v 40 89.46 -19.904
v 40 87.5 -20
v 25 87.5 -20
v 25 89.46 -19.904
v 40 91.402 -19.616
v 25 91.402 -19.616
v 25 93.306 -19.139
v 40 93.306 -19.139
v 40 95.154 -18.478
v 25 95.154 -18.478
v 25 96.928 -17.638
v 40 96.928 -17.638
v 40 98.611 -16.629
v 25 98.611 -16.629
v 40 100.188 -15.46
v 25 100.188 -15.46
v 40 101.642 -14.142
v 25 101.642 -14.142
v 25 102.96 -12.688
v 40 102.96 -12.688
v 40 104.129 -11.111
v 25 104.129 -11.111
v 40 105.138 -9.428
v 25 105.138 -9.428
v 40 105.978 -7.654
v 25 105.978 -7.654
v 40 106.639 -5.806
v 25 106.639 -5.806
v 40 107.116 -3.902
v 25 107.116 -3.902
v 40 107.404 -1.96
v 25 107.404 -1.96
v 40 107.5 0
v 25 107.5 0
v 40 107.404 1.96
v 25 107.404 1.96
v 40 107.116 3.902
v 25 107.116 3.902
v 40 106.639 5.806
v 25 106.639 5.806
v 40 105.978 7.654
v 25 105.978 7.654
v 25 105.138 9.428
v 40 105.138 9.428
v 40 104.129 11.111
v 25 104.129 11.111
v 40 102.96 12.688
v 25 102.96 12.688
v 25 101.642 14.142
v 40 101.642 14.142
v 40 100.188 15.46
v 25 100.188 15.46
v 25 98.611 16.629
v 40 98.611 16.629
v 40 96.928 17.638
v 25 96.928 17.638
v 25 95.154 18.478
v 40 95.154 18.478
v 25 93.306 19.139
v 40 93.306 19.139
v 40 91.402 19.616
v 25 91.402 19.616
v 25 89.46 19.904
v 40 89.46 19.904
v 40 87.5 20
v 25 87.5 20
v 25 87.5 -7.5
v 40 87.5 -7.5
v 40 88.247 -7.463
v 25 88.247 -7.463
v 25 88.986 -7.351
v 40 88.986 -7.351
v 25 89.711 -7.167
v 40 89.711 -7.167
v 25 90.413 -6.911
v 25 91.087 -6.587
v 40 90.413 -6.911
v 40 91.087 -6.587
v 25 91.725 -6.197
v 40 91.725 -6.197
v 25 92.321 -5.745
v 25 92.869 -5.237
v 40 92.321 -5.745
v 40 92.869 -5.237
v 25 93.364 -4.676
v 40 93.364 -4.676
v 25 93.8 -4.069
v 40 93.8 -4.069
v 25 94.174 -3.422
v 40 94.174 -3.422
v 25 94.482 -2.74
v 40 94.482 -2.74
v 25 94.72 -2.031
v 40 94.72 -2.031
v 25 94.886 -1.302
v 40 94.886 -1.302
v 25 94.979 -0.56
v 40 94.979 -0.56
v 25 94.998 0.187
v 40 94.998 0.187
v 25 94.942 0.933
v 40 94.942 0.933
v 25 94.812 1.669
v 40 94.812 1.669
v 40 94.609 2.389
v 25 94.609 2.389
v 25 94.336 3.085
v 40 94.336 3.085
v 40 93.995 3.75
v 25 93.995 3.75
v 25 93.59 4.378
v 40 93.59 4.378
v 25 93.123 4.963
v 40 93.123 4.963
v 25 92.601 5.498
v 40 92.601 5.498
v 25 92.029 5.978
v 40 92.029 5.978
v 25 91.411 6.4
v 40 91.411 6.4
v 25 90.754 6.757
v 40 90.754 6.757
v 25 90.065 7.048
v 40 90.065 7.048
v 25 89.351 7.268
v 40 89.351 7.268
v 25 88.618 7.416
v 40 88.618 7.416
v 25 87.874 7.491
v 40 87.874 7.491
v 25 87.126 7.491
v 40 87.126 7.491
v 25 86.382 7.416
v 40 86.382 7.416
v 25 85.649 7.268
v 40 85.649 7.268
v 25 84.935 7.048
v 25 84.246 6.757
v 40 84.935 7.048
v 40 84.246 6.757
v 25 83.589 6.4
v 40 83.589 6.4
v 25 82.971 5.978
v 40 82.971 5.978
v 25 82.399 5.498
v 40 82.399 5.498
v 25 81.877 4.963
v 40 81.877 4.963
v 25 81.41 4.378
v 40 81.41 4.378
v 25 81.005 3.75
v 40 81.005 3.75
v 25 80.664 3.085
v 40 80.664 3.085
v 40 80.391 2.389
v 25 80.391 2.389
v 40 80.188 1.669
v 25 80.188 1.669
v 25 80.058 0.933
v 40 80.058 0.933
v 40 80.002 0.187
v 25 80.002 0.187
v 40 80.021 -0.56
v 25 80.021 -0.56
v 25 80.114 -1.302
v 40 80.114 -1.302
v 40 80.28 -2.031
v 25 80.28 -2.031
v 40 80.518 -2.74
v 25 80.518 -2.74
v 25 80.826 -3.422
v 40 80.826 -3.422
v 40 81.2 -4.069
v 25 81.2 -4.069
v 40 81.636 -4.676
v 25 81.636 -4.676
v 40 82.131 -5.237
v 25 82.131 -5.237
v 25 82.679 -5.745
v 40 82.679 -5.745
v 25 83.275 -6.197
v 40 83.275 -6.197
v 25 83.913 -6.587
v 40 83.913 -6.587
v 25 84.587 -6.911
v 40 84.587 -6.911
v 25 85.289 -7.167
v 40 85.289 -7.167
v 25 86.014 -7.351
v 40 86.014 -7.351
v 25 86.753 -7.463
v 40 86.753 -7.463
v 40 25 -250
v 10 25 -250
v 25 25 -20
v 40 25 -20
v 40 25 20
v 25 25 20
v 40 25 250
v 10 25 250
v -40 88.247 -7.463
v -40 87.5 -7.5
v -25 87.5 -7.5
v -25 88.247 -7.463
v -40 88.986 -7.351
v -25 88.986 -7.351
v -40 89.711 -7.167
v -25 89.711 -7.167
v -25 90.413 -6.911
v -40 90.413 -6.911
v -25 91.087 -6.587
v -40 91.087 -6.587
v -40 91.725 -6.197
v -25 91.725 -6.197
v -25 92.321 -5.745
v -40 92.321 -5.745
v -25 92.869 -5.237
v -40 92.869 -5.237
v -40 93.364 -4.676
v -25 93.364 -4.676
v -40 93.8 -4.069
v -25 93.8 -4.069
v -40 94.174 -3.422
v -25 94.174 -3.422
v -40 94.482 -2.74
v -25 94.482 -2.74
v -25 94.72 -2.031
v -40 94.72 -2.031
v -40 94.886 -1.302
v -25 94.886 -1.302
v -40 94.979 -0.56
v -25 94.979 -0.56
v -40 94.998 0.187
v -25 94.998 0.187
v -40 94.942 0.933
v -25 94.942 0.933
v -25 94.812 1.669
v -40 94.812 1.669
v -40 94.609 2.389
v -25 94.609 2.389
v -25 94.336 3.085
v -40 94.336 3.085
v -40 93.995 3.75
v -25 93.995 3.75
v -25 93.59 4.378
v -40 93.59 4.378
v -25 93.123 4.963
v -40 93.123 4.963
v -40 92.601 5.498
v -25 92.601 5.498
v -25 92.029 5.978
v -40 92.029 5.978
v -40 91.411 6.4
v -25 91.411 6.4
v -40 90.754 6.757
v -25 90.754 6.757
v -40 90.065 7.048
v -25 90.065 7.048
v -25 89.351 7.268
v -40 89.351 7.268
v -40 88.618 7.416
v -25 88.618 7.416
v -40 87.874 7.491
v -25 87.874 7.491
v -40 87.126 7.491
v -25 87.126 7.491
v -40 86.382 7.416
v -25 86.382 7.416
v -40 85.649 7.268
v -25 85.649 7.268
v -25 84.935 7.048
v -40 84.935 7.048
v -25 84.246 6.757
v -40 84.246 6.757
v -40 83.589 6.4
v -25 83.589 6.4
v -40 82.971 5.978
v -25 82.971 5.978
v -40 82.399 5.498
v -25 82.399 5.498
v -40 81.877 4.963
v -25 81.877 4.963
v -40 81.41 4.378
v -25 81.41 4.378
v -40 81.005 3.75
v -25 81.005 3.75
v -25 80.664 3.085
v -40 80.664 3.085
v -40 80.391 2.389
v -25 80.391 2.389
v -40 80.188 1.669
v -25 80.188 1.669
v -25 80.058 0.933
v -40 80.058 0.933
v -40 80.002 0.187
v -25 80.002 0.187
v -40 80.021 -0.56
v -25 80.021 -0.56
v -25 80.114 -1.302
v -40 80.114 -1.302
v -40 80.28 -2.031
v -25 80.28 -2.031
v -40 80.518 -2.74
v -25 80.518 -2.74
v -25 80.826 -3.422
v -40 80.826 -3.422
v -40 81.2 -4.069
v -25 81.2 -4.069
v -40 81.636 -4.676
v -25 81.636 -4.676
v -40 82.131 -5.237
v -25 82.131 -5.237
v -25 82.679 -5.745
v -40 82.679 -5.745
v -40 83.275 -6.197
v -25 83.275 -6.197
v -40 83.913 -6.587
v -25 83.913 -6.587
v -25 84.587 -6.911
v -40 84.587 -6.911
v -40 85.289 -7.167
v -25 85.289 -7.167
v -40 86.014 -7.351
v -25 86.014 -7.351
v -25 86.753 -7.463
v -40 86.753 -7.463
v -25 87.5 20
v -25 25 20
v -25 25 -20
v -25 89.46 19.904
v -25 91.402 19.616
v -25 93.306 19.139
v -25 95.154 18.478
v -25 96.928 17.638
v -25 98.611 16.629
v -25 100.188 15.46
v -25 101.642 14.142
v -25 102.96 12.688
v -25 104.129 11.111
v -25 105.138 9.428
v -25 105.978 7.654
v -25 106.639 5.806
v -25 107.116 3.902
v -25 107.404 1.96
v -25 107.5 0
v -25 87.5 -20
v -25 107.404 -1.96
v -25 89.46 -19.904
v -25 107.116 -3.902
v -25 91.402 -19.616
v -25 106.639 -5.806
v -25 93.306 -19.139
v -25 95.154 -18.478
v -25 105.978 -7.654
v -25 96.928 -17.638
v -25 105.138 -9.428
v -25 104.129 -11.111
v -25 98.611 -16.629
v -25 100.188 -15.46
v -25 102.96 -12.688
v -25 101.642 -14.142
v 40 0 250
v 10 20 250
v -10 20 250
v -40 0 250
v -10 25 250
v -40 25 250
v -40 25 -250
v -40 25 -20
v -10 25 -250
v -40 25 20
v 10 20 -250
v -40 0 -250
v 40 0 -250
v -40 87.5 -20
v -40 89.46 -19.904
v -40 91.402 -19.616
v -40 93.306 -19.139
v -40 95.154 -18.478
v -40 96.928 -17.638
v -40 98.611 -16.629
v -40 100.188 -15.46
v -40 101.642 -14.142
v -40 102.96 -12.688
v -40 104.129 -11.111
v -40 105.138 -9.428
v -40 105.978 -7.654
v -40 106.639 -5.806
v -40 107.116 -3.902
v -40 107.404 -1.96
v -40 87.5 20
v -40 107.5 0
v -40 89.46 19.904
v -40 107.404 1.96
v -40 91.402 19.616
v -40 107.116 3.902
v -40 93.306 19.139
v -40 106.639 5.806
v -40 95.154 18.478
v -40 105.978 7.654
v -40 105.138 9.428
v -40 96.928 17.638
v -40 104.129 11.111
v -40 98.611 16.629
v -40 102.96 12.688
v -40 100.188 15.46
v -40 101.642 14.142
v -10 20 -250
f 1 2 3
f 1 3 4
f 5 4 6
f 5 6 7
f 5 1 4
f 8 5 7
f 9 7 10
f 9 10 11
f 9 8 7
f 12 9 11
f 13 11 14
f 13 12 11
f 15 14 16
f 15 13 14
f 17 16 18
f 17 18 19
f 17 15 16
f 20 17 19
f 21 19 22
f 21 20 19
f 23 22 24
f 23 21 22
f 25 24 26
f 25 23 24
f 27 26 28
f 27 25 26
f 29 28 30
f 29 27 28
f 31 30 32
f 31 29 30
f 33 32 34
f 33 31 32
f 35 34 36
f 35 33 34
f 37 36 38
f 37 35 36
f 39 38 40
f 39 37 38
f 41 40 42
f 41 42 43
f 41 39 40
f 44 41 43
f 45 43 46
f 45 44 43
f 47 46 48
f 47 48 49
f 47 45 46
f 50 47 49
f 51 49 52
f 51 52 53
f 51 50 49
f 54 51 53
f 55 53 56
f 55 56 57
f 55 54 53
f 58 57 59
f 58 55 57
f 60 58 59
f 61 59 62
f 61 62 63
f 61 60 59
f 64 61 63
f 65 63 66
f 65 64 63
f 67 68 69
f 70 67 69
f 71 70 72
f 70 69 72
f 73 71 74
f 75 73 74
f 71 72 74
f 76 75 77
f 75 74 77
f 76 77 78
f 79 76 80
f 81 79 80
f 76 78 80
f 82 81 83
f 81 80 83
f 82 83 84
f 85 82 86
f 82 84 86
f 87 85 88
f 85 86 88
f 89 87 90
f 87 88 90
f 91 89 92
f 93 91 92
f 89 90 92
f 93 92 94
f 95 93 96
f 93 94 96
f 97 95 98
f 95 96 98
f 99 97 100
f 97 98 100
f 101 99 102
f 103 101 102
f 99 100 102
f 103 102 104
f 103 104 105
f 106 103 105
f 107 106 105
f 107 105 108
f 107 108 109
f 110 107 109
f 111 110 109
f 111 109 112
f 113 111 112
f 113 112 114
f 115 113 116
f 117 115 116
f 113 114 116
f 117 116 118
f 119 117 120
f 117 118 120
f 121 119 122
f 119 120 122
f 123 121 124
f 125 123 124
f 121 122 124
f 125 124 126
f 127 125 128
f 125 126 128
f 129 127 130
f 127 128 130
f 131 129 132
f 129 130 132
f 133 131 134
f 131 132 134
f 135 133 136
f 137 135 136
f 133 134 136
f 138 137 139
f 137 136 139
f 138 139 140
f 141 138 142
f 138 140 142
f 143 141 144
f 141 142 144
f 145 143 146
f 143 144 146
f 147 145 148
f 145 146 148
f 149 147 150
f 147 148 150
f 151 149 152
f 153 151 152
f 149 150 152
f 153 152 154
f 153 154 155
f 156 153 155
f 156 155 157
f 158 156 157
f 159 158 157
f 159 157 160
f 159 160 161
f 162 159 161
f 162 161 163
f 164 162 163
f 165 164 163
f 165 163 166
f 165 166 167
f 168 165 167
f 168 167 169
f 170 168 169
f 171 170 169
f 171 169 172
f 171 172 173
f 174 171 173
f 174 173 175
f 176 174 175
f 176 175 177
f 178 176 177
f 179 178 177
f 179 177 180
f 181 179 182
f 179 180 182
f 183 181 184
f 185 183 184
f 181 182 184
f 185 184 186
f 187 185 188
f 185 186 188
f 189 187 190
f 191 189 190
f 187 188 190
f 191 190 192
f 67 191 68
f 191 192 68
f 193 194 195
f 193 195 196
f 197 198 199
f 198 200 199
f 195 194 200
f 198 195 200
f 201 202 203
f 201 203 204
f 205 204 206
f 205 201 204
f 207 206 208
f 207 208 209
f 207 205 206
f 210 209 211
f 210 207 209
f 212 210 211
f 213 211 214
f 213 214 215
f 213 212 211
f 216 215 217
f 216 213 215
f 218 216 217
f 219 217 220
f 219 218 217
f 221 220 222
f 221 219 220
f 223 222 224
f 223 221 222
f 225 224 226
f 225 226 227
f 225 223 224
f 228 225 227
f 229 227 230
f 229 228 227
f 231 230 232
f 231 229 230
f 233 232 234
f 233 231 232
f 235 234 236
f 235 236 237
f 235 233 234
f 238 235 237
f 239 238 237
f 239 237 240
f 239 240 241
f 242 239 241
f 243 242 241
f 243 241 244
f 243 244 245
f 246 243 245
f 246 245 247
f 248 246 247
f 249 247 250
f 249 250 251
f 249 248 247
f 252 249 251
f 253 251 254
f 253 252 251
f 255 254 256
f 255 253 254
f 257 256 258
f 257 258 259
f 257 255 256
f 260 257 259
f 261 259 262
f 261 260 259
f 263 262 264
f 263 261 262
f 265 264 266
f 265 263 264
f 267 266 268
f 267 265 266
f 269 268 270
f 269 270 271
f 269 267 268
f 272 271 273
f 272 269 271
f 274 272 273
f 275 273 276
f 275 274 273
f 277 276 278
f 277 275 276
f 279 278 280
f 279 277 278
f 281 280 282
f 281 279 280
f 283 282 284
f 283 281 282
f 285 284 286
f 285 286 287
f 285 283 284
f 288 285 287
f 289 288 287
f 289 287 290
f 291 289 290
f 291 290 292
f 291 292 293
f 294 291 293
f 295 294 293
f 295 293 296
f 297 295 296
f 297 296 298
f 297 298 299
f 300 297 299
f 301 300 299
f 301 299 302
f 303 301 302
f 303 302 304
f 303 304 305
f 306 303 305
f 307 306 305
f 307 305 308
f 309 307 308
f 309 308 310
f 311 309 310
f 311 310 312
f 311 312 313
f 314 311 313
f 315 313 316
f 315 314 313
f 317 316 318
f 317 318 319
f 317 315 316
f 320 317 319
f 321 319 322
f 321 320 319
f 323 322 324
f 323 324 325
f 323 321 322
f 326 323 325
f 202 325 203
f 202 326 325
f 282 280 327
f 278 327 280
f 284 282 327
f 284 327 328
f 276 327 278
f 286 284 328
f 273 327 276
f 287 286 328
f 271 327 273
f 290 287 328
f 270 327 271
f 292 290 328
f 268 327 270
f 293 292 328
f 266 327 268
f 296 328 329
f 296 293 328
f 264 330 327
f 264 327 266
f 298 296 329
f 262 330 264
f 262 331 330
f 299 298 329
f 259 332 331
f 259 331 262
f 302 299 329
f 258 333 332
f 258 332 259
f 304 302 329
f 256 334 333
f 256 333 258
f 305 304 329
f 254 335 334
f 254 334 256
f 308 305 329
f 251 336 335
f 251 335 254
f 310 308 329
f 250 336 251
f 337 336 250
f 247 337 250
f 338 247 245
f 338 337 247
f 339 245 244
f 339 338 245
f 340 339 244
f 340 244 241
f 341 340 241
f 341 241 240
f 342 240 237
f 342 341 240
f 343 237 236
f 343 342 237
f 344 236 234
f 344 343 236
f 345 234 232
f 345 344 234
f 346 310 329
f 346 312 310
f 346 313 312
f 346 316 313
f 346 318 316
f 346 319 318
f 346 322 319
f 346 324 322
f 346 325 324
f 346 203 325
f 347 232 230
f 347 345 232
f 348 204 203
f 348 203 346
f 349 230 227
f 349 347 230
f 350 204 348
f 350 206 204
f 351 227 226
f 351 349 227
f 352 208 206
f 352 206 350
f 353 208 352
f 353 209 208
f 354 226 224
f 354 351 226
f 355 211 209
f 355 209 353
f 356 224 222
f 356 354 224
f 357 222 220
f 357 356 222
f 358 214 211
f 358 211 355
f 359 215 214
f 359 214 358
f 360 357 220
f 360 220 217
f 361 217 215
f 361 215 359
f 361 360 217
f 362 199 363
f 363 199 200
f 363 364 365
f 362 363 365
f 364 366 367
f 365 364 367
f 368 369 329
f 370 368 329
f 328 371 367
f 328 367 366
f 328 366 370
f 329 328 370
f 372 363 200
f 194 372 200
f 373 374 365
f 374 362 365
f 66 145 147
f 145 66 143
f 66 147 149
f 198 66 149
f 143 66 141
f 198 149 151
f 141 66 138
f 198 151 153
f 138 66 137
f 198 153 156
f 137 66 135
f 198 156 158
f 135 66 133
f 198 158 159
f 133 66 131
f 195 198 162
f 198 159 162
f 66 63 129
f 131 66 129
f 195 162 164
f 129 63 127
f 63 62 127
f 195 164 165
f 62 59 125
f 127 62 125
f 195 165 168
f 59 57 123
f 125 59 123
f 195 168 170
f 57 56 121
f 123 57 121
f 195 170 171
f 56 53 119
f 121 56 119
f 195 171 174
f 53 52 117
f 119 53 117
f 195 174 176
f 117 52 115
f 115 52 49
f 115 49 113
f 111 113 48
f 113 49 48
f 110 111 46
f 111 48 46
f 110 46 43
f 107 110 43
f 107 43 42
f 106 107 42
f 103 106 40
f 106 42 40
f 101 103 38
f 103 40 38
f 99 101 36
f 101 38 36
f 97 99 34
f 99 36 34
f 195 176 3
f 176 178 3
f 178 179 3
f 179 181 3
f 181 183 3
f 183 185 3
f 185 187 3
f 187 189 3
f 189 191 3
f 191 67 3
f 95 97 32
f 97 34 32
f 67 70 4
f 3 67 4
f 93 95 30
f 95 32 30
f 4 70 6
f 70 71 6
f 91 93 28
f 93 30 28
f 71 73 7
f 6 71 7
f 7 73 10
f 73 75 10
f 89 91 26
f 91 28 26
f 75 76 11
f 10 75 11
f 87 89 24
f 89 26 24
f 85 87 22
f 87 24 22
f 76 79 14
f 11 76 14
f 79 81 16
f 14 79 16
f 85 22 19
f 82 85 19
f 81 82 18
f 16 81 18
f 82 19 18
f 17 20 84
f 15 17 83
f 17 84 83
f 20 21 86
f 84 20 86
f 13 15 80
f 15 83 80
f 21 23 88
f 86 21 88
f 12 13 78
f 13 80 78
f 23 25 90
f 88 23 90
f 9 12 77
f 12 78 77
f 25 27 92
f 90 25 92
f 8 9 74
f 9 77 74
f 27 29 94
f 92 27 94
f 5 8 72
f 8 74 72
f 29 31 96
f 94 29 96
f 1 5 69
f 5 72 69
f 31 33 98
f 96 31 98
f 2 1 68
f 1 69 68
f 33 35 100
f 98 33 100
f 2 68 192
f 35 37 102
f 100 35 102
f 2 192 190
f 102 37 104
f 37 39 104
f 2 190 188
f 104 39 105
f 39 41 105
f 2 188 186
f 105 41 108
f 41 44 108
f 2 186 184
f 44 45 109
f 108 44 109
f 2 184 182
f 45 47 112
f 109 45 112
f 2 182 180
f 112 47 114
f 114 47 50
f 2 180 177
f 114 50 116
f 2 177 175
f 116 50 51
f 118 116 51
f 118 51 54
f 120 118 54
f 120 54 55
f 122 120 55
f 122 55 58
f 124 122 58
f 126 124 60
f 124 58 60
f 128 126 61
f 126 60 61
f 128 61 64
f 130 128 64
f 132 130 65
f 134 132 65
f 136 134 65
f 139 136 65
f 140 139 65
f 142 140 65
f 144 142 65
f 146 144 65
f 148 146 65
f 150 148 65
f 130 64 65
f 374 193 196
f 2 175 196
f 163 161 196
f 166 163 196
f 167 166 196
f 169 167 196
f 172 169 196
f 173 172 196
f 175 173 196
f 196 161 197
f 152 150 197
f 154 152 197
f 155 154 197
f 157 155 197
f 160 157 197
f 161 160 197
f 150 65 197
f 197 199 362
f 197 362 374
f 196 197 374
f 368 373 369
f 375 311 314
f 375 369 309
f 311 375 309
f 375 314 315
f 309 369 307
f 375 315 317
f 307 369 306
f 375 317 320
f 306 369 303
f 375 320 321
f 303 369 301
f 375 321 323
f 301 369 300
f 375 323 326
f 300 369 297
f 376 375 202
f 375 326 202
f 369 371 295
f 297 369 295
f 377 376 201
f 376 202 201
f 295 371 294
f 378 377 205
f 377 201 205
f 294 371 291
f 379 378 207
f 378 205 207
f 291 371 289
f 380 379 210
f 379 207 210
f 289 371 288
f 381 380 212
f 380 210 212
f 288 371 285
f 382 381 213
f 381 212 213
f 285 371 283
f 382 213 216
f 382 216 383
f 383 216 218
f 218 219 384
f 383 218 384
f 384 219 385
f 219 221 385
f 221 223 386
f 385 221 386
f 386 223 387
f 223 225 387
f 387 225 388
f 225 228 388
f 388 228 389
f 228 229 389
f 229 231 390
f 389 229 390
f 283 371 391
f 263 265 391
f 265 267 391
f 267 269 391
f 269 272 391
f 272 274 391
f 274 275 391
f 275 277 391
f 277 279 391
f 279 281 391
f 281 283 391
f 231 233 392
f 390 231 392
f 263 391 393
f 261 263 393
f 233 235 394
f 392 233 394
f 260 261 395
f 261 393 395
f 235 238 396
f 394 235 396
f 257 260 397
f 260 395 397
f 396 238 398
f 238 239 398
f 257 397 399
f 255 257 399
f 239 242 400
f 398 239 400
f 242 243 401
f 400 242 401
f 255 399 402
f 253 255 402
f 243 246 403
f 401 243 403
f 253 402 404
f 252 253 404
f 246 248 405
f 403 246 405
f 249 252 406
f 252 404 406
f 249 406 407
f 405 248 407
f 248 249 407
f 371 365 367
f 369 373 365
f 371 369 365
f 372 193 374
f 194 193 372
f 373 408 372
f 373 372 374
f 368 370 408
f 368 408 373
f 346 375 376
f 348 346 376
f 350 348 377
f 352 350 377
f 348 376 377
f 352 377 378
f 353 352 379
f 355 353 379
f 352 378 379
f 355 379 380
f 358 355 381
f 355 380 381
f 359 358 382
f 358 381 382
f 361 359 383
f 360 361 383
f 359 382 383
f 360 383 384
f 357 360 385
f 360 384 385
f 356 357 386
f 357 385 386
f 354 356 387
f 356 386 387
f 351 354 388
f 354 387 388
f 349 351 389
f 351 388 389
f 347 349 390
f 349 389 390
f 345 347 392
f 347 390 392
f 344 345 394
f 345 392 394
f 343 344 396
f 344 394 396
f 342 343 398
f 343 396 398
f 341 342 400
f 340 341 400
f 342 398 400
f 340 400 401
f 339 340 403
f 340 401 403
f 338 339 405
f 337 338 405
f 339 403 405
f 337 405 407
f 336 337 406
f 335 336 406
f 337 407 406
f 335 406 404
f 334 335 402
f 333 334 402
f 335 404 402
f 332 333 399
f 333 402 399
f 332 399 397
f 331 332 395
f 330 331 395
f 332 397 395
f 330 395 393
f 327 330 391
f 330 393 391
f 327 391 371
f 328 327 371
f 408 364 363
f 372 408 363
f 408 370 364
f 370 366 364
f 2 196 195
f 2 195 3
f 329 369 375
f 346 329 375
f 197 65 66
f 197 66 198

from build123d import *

# Parameters (mm, degrees)
Y_KSEKLIK_EKSTR_ZYON1_DEPTH = 250
IZIM3_R                     = 7.5
Y_KSEKLIK_EKSTR_ZYON3_DEPTH = 15


with BuildPart() as part:
    # Çizim2 → Yükseklik-Ekstrüzyon1 (new body, symmetric)
    with BuildSketch(Plane.XY):
        Polygon((10, 25), (40, 25), (40, 0), (-40, 0), (-40, 25), (-10, 25), (-10, 20), (10, 20), align=None)
    extrude(amount=Y_KSEKLIK_EKSTR_ZYON1_DEPTH, both=True)

    # Çizim3 → Yükseklik-Ekstrüzyon3 (add)
    with BuildSketch(Plane(origin=(40, 0, 0), x_dir=(0, 0, -1), z_dir=(1, 0, 0))):
        with BuildLine():
            Line((-20, 25), (20, 25))
            Line((20, 25), (20, 87.5))
            ThreePointArc((20, 87.5), (0, 107.5), (-20, 87.5))
            Line((-20, 87.5), (-20, 25))
        make_face()
        with Locations((0, 87.5)):
            Circle(IZIM3_R, mode=Mode.SUBTRACT)
    y_kseklik_ekstr_zyon3 = extrude(amount=-Y_KSEKLIK_EKSTR_ZYON3_DEPTH)

    # Aynalama1: Yükseklik-Ekstrüzyon3 across plane
    add(y_kseklik_ekstr_zyon3.mirror(Plane.ZY))


solid = part.part
